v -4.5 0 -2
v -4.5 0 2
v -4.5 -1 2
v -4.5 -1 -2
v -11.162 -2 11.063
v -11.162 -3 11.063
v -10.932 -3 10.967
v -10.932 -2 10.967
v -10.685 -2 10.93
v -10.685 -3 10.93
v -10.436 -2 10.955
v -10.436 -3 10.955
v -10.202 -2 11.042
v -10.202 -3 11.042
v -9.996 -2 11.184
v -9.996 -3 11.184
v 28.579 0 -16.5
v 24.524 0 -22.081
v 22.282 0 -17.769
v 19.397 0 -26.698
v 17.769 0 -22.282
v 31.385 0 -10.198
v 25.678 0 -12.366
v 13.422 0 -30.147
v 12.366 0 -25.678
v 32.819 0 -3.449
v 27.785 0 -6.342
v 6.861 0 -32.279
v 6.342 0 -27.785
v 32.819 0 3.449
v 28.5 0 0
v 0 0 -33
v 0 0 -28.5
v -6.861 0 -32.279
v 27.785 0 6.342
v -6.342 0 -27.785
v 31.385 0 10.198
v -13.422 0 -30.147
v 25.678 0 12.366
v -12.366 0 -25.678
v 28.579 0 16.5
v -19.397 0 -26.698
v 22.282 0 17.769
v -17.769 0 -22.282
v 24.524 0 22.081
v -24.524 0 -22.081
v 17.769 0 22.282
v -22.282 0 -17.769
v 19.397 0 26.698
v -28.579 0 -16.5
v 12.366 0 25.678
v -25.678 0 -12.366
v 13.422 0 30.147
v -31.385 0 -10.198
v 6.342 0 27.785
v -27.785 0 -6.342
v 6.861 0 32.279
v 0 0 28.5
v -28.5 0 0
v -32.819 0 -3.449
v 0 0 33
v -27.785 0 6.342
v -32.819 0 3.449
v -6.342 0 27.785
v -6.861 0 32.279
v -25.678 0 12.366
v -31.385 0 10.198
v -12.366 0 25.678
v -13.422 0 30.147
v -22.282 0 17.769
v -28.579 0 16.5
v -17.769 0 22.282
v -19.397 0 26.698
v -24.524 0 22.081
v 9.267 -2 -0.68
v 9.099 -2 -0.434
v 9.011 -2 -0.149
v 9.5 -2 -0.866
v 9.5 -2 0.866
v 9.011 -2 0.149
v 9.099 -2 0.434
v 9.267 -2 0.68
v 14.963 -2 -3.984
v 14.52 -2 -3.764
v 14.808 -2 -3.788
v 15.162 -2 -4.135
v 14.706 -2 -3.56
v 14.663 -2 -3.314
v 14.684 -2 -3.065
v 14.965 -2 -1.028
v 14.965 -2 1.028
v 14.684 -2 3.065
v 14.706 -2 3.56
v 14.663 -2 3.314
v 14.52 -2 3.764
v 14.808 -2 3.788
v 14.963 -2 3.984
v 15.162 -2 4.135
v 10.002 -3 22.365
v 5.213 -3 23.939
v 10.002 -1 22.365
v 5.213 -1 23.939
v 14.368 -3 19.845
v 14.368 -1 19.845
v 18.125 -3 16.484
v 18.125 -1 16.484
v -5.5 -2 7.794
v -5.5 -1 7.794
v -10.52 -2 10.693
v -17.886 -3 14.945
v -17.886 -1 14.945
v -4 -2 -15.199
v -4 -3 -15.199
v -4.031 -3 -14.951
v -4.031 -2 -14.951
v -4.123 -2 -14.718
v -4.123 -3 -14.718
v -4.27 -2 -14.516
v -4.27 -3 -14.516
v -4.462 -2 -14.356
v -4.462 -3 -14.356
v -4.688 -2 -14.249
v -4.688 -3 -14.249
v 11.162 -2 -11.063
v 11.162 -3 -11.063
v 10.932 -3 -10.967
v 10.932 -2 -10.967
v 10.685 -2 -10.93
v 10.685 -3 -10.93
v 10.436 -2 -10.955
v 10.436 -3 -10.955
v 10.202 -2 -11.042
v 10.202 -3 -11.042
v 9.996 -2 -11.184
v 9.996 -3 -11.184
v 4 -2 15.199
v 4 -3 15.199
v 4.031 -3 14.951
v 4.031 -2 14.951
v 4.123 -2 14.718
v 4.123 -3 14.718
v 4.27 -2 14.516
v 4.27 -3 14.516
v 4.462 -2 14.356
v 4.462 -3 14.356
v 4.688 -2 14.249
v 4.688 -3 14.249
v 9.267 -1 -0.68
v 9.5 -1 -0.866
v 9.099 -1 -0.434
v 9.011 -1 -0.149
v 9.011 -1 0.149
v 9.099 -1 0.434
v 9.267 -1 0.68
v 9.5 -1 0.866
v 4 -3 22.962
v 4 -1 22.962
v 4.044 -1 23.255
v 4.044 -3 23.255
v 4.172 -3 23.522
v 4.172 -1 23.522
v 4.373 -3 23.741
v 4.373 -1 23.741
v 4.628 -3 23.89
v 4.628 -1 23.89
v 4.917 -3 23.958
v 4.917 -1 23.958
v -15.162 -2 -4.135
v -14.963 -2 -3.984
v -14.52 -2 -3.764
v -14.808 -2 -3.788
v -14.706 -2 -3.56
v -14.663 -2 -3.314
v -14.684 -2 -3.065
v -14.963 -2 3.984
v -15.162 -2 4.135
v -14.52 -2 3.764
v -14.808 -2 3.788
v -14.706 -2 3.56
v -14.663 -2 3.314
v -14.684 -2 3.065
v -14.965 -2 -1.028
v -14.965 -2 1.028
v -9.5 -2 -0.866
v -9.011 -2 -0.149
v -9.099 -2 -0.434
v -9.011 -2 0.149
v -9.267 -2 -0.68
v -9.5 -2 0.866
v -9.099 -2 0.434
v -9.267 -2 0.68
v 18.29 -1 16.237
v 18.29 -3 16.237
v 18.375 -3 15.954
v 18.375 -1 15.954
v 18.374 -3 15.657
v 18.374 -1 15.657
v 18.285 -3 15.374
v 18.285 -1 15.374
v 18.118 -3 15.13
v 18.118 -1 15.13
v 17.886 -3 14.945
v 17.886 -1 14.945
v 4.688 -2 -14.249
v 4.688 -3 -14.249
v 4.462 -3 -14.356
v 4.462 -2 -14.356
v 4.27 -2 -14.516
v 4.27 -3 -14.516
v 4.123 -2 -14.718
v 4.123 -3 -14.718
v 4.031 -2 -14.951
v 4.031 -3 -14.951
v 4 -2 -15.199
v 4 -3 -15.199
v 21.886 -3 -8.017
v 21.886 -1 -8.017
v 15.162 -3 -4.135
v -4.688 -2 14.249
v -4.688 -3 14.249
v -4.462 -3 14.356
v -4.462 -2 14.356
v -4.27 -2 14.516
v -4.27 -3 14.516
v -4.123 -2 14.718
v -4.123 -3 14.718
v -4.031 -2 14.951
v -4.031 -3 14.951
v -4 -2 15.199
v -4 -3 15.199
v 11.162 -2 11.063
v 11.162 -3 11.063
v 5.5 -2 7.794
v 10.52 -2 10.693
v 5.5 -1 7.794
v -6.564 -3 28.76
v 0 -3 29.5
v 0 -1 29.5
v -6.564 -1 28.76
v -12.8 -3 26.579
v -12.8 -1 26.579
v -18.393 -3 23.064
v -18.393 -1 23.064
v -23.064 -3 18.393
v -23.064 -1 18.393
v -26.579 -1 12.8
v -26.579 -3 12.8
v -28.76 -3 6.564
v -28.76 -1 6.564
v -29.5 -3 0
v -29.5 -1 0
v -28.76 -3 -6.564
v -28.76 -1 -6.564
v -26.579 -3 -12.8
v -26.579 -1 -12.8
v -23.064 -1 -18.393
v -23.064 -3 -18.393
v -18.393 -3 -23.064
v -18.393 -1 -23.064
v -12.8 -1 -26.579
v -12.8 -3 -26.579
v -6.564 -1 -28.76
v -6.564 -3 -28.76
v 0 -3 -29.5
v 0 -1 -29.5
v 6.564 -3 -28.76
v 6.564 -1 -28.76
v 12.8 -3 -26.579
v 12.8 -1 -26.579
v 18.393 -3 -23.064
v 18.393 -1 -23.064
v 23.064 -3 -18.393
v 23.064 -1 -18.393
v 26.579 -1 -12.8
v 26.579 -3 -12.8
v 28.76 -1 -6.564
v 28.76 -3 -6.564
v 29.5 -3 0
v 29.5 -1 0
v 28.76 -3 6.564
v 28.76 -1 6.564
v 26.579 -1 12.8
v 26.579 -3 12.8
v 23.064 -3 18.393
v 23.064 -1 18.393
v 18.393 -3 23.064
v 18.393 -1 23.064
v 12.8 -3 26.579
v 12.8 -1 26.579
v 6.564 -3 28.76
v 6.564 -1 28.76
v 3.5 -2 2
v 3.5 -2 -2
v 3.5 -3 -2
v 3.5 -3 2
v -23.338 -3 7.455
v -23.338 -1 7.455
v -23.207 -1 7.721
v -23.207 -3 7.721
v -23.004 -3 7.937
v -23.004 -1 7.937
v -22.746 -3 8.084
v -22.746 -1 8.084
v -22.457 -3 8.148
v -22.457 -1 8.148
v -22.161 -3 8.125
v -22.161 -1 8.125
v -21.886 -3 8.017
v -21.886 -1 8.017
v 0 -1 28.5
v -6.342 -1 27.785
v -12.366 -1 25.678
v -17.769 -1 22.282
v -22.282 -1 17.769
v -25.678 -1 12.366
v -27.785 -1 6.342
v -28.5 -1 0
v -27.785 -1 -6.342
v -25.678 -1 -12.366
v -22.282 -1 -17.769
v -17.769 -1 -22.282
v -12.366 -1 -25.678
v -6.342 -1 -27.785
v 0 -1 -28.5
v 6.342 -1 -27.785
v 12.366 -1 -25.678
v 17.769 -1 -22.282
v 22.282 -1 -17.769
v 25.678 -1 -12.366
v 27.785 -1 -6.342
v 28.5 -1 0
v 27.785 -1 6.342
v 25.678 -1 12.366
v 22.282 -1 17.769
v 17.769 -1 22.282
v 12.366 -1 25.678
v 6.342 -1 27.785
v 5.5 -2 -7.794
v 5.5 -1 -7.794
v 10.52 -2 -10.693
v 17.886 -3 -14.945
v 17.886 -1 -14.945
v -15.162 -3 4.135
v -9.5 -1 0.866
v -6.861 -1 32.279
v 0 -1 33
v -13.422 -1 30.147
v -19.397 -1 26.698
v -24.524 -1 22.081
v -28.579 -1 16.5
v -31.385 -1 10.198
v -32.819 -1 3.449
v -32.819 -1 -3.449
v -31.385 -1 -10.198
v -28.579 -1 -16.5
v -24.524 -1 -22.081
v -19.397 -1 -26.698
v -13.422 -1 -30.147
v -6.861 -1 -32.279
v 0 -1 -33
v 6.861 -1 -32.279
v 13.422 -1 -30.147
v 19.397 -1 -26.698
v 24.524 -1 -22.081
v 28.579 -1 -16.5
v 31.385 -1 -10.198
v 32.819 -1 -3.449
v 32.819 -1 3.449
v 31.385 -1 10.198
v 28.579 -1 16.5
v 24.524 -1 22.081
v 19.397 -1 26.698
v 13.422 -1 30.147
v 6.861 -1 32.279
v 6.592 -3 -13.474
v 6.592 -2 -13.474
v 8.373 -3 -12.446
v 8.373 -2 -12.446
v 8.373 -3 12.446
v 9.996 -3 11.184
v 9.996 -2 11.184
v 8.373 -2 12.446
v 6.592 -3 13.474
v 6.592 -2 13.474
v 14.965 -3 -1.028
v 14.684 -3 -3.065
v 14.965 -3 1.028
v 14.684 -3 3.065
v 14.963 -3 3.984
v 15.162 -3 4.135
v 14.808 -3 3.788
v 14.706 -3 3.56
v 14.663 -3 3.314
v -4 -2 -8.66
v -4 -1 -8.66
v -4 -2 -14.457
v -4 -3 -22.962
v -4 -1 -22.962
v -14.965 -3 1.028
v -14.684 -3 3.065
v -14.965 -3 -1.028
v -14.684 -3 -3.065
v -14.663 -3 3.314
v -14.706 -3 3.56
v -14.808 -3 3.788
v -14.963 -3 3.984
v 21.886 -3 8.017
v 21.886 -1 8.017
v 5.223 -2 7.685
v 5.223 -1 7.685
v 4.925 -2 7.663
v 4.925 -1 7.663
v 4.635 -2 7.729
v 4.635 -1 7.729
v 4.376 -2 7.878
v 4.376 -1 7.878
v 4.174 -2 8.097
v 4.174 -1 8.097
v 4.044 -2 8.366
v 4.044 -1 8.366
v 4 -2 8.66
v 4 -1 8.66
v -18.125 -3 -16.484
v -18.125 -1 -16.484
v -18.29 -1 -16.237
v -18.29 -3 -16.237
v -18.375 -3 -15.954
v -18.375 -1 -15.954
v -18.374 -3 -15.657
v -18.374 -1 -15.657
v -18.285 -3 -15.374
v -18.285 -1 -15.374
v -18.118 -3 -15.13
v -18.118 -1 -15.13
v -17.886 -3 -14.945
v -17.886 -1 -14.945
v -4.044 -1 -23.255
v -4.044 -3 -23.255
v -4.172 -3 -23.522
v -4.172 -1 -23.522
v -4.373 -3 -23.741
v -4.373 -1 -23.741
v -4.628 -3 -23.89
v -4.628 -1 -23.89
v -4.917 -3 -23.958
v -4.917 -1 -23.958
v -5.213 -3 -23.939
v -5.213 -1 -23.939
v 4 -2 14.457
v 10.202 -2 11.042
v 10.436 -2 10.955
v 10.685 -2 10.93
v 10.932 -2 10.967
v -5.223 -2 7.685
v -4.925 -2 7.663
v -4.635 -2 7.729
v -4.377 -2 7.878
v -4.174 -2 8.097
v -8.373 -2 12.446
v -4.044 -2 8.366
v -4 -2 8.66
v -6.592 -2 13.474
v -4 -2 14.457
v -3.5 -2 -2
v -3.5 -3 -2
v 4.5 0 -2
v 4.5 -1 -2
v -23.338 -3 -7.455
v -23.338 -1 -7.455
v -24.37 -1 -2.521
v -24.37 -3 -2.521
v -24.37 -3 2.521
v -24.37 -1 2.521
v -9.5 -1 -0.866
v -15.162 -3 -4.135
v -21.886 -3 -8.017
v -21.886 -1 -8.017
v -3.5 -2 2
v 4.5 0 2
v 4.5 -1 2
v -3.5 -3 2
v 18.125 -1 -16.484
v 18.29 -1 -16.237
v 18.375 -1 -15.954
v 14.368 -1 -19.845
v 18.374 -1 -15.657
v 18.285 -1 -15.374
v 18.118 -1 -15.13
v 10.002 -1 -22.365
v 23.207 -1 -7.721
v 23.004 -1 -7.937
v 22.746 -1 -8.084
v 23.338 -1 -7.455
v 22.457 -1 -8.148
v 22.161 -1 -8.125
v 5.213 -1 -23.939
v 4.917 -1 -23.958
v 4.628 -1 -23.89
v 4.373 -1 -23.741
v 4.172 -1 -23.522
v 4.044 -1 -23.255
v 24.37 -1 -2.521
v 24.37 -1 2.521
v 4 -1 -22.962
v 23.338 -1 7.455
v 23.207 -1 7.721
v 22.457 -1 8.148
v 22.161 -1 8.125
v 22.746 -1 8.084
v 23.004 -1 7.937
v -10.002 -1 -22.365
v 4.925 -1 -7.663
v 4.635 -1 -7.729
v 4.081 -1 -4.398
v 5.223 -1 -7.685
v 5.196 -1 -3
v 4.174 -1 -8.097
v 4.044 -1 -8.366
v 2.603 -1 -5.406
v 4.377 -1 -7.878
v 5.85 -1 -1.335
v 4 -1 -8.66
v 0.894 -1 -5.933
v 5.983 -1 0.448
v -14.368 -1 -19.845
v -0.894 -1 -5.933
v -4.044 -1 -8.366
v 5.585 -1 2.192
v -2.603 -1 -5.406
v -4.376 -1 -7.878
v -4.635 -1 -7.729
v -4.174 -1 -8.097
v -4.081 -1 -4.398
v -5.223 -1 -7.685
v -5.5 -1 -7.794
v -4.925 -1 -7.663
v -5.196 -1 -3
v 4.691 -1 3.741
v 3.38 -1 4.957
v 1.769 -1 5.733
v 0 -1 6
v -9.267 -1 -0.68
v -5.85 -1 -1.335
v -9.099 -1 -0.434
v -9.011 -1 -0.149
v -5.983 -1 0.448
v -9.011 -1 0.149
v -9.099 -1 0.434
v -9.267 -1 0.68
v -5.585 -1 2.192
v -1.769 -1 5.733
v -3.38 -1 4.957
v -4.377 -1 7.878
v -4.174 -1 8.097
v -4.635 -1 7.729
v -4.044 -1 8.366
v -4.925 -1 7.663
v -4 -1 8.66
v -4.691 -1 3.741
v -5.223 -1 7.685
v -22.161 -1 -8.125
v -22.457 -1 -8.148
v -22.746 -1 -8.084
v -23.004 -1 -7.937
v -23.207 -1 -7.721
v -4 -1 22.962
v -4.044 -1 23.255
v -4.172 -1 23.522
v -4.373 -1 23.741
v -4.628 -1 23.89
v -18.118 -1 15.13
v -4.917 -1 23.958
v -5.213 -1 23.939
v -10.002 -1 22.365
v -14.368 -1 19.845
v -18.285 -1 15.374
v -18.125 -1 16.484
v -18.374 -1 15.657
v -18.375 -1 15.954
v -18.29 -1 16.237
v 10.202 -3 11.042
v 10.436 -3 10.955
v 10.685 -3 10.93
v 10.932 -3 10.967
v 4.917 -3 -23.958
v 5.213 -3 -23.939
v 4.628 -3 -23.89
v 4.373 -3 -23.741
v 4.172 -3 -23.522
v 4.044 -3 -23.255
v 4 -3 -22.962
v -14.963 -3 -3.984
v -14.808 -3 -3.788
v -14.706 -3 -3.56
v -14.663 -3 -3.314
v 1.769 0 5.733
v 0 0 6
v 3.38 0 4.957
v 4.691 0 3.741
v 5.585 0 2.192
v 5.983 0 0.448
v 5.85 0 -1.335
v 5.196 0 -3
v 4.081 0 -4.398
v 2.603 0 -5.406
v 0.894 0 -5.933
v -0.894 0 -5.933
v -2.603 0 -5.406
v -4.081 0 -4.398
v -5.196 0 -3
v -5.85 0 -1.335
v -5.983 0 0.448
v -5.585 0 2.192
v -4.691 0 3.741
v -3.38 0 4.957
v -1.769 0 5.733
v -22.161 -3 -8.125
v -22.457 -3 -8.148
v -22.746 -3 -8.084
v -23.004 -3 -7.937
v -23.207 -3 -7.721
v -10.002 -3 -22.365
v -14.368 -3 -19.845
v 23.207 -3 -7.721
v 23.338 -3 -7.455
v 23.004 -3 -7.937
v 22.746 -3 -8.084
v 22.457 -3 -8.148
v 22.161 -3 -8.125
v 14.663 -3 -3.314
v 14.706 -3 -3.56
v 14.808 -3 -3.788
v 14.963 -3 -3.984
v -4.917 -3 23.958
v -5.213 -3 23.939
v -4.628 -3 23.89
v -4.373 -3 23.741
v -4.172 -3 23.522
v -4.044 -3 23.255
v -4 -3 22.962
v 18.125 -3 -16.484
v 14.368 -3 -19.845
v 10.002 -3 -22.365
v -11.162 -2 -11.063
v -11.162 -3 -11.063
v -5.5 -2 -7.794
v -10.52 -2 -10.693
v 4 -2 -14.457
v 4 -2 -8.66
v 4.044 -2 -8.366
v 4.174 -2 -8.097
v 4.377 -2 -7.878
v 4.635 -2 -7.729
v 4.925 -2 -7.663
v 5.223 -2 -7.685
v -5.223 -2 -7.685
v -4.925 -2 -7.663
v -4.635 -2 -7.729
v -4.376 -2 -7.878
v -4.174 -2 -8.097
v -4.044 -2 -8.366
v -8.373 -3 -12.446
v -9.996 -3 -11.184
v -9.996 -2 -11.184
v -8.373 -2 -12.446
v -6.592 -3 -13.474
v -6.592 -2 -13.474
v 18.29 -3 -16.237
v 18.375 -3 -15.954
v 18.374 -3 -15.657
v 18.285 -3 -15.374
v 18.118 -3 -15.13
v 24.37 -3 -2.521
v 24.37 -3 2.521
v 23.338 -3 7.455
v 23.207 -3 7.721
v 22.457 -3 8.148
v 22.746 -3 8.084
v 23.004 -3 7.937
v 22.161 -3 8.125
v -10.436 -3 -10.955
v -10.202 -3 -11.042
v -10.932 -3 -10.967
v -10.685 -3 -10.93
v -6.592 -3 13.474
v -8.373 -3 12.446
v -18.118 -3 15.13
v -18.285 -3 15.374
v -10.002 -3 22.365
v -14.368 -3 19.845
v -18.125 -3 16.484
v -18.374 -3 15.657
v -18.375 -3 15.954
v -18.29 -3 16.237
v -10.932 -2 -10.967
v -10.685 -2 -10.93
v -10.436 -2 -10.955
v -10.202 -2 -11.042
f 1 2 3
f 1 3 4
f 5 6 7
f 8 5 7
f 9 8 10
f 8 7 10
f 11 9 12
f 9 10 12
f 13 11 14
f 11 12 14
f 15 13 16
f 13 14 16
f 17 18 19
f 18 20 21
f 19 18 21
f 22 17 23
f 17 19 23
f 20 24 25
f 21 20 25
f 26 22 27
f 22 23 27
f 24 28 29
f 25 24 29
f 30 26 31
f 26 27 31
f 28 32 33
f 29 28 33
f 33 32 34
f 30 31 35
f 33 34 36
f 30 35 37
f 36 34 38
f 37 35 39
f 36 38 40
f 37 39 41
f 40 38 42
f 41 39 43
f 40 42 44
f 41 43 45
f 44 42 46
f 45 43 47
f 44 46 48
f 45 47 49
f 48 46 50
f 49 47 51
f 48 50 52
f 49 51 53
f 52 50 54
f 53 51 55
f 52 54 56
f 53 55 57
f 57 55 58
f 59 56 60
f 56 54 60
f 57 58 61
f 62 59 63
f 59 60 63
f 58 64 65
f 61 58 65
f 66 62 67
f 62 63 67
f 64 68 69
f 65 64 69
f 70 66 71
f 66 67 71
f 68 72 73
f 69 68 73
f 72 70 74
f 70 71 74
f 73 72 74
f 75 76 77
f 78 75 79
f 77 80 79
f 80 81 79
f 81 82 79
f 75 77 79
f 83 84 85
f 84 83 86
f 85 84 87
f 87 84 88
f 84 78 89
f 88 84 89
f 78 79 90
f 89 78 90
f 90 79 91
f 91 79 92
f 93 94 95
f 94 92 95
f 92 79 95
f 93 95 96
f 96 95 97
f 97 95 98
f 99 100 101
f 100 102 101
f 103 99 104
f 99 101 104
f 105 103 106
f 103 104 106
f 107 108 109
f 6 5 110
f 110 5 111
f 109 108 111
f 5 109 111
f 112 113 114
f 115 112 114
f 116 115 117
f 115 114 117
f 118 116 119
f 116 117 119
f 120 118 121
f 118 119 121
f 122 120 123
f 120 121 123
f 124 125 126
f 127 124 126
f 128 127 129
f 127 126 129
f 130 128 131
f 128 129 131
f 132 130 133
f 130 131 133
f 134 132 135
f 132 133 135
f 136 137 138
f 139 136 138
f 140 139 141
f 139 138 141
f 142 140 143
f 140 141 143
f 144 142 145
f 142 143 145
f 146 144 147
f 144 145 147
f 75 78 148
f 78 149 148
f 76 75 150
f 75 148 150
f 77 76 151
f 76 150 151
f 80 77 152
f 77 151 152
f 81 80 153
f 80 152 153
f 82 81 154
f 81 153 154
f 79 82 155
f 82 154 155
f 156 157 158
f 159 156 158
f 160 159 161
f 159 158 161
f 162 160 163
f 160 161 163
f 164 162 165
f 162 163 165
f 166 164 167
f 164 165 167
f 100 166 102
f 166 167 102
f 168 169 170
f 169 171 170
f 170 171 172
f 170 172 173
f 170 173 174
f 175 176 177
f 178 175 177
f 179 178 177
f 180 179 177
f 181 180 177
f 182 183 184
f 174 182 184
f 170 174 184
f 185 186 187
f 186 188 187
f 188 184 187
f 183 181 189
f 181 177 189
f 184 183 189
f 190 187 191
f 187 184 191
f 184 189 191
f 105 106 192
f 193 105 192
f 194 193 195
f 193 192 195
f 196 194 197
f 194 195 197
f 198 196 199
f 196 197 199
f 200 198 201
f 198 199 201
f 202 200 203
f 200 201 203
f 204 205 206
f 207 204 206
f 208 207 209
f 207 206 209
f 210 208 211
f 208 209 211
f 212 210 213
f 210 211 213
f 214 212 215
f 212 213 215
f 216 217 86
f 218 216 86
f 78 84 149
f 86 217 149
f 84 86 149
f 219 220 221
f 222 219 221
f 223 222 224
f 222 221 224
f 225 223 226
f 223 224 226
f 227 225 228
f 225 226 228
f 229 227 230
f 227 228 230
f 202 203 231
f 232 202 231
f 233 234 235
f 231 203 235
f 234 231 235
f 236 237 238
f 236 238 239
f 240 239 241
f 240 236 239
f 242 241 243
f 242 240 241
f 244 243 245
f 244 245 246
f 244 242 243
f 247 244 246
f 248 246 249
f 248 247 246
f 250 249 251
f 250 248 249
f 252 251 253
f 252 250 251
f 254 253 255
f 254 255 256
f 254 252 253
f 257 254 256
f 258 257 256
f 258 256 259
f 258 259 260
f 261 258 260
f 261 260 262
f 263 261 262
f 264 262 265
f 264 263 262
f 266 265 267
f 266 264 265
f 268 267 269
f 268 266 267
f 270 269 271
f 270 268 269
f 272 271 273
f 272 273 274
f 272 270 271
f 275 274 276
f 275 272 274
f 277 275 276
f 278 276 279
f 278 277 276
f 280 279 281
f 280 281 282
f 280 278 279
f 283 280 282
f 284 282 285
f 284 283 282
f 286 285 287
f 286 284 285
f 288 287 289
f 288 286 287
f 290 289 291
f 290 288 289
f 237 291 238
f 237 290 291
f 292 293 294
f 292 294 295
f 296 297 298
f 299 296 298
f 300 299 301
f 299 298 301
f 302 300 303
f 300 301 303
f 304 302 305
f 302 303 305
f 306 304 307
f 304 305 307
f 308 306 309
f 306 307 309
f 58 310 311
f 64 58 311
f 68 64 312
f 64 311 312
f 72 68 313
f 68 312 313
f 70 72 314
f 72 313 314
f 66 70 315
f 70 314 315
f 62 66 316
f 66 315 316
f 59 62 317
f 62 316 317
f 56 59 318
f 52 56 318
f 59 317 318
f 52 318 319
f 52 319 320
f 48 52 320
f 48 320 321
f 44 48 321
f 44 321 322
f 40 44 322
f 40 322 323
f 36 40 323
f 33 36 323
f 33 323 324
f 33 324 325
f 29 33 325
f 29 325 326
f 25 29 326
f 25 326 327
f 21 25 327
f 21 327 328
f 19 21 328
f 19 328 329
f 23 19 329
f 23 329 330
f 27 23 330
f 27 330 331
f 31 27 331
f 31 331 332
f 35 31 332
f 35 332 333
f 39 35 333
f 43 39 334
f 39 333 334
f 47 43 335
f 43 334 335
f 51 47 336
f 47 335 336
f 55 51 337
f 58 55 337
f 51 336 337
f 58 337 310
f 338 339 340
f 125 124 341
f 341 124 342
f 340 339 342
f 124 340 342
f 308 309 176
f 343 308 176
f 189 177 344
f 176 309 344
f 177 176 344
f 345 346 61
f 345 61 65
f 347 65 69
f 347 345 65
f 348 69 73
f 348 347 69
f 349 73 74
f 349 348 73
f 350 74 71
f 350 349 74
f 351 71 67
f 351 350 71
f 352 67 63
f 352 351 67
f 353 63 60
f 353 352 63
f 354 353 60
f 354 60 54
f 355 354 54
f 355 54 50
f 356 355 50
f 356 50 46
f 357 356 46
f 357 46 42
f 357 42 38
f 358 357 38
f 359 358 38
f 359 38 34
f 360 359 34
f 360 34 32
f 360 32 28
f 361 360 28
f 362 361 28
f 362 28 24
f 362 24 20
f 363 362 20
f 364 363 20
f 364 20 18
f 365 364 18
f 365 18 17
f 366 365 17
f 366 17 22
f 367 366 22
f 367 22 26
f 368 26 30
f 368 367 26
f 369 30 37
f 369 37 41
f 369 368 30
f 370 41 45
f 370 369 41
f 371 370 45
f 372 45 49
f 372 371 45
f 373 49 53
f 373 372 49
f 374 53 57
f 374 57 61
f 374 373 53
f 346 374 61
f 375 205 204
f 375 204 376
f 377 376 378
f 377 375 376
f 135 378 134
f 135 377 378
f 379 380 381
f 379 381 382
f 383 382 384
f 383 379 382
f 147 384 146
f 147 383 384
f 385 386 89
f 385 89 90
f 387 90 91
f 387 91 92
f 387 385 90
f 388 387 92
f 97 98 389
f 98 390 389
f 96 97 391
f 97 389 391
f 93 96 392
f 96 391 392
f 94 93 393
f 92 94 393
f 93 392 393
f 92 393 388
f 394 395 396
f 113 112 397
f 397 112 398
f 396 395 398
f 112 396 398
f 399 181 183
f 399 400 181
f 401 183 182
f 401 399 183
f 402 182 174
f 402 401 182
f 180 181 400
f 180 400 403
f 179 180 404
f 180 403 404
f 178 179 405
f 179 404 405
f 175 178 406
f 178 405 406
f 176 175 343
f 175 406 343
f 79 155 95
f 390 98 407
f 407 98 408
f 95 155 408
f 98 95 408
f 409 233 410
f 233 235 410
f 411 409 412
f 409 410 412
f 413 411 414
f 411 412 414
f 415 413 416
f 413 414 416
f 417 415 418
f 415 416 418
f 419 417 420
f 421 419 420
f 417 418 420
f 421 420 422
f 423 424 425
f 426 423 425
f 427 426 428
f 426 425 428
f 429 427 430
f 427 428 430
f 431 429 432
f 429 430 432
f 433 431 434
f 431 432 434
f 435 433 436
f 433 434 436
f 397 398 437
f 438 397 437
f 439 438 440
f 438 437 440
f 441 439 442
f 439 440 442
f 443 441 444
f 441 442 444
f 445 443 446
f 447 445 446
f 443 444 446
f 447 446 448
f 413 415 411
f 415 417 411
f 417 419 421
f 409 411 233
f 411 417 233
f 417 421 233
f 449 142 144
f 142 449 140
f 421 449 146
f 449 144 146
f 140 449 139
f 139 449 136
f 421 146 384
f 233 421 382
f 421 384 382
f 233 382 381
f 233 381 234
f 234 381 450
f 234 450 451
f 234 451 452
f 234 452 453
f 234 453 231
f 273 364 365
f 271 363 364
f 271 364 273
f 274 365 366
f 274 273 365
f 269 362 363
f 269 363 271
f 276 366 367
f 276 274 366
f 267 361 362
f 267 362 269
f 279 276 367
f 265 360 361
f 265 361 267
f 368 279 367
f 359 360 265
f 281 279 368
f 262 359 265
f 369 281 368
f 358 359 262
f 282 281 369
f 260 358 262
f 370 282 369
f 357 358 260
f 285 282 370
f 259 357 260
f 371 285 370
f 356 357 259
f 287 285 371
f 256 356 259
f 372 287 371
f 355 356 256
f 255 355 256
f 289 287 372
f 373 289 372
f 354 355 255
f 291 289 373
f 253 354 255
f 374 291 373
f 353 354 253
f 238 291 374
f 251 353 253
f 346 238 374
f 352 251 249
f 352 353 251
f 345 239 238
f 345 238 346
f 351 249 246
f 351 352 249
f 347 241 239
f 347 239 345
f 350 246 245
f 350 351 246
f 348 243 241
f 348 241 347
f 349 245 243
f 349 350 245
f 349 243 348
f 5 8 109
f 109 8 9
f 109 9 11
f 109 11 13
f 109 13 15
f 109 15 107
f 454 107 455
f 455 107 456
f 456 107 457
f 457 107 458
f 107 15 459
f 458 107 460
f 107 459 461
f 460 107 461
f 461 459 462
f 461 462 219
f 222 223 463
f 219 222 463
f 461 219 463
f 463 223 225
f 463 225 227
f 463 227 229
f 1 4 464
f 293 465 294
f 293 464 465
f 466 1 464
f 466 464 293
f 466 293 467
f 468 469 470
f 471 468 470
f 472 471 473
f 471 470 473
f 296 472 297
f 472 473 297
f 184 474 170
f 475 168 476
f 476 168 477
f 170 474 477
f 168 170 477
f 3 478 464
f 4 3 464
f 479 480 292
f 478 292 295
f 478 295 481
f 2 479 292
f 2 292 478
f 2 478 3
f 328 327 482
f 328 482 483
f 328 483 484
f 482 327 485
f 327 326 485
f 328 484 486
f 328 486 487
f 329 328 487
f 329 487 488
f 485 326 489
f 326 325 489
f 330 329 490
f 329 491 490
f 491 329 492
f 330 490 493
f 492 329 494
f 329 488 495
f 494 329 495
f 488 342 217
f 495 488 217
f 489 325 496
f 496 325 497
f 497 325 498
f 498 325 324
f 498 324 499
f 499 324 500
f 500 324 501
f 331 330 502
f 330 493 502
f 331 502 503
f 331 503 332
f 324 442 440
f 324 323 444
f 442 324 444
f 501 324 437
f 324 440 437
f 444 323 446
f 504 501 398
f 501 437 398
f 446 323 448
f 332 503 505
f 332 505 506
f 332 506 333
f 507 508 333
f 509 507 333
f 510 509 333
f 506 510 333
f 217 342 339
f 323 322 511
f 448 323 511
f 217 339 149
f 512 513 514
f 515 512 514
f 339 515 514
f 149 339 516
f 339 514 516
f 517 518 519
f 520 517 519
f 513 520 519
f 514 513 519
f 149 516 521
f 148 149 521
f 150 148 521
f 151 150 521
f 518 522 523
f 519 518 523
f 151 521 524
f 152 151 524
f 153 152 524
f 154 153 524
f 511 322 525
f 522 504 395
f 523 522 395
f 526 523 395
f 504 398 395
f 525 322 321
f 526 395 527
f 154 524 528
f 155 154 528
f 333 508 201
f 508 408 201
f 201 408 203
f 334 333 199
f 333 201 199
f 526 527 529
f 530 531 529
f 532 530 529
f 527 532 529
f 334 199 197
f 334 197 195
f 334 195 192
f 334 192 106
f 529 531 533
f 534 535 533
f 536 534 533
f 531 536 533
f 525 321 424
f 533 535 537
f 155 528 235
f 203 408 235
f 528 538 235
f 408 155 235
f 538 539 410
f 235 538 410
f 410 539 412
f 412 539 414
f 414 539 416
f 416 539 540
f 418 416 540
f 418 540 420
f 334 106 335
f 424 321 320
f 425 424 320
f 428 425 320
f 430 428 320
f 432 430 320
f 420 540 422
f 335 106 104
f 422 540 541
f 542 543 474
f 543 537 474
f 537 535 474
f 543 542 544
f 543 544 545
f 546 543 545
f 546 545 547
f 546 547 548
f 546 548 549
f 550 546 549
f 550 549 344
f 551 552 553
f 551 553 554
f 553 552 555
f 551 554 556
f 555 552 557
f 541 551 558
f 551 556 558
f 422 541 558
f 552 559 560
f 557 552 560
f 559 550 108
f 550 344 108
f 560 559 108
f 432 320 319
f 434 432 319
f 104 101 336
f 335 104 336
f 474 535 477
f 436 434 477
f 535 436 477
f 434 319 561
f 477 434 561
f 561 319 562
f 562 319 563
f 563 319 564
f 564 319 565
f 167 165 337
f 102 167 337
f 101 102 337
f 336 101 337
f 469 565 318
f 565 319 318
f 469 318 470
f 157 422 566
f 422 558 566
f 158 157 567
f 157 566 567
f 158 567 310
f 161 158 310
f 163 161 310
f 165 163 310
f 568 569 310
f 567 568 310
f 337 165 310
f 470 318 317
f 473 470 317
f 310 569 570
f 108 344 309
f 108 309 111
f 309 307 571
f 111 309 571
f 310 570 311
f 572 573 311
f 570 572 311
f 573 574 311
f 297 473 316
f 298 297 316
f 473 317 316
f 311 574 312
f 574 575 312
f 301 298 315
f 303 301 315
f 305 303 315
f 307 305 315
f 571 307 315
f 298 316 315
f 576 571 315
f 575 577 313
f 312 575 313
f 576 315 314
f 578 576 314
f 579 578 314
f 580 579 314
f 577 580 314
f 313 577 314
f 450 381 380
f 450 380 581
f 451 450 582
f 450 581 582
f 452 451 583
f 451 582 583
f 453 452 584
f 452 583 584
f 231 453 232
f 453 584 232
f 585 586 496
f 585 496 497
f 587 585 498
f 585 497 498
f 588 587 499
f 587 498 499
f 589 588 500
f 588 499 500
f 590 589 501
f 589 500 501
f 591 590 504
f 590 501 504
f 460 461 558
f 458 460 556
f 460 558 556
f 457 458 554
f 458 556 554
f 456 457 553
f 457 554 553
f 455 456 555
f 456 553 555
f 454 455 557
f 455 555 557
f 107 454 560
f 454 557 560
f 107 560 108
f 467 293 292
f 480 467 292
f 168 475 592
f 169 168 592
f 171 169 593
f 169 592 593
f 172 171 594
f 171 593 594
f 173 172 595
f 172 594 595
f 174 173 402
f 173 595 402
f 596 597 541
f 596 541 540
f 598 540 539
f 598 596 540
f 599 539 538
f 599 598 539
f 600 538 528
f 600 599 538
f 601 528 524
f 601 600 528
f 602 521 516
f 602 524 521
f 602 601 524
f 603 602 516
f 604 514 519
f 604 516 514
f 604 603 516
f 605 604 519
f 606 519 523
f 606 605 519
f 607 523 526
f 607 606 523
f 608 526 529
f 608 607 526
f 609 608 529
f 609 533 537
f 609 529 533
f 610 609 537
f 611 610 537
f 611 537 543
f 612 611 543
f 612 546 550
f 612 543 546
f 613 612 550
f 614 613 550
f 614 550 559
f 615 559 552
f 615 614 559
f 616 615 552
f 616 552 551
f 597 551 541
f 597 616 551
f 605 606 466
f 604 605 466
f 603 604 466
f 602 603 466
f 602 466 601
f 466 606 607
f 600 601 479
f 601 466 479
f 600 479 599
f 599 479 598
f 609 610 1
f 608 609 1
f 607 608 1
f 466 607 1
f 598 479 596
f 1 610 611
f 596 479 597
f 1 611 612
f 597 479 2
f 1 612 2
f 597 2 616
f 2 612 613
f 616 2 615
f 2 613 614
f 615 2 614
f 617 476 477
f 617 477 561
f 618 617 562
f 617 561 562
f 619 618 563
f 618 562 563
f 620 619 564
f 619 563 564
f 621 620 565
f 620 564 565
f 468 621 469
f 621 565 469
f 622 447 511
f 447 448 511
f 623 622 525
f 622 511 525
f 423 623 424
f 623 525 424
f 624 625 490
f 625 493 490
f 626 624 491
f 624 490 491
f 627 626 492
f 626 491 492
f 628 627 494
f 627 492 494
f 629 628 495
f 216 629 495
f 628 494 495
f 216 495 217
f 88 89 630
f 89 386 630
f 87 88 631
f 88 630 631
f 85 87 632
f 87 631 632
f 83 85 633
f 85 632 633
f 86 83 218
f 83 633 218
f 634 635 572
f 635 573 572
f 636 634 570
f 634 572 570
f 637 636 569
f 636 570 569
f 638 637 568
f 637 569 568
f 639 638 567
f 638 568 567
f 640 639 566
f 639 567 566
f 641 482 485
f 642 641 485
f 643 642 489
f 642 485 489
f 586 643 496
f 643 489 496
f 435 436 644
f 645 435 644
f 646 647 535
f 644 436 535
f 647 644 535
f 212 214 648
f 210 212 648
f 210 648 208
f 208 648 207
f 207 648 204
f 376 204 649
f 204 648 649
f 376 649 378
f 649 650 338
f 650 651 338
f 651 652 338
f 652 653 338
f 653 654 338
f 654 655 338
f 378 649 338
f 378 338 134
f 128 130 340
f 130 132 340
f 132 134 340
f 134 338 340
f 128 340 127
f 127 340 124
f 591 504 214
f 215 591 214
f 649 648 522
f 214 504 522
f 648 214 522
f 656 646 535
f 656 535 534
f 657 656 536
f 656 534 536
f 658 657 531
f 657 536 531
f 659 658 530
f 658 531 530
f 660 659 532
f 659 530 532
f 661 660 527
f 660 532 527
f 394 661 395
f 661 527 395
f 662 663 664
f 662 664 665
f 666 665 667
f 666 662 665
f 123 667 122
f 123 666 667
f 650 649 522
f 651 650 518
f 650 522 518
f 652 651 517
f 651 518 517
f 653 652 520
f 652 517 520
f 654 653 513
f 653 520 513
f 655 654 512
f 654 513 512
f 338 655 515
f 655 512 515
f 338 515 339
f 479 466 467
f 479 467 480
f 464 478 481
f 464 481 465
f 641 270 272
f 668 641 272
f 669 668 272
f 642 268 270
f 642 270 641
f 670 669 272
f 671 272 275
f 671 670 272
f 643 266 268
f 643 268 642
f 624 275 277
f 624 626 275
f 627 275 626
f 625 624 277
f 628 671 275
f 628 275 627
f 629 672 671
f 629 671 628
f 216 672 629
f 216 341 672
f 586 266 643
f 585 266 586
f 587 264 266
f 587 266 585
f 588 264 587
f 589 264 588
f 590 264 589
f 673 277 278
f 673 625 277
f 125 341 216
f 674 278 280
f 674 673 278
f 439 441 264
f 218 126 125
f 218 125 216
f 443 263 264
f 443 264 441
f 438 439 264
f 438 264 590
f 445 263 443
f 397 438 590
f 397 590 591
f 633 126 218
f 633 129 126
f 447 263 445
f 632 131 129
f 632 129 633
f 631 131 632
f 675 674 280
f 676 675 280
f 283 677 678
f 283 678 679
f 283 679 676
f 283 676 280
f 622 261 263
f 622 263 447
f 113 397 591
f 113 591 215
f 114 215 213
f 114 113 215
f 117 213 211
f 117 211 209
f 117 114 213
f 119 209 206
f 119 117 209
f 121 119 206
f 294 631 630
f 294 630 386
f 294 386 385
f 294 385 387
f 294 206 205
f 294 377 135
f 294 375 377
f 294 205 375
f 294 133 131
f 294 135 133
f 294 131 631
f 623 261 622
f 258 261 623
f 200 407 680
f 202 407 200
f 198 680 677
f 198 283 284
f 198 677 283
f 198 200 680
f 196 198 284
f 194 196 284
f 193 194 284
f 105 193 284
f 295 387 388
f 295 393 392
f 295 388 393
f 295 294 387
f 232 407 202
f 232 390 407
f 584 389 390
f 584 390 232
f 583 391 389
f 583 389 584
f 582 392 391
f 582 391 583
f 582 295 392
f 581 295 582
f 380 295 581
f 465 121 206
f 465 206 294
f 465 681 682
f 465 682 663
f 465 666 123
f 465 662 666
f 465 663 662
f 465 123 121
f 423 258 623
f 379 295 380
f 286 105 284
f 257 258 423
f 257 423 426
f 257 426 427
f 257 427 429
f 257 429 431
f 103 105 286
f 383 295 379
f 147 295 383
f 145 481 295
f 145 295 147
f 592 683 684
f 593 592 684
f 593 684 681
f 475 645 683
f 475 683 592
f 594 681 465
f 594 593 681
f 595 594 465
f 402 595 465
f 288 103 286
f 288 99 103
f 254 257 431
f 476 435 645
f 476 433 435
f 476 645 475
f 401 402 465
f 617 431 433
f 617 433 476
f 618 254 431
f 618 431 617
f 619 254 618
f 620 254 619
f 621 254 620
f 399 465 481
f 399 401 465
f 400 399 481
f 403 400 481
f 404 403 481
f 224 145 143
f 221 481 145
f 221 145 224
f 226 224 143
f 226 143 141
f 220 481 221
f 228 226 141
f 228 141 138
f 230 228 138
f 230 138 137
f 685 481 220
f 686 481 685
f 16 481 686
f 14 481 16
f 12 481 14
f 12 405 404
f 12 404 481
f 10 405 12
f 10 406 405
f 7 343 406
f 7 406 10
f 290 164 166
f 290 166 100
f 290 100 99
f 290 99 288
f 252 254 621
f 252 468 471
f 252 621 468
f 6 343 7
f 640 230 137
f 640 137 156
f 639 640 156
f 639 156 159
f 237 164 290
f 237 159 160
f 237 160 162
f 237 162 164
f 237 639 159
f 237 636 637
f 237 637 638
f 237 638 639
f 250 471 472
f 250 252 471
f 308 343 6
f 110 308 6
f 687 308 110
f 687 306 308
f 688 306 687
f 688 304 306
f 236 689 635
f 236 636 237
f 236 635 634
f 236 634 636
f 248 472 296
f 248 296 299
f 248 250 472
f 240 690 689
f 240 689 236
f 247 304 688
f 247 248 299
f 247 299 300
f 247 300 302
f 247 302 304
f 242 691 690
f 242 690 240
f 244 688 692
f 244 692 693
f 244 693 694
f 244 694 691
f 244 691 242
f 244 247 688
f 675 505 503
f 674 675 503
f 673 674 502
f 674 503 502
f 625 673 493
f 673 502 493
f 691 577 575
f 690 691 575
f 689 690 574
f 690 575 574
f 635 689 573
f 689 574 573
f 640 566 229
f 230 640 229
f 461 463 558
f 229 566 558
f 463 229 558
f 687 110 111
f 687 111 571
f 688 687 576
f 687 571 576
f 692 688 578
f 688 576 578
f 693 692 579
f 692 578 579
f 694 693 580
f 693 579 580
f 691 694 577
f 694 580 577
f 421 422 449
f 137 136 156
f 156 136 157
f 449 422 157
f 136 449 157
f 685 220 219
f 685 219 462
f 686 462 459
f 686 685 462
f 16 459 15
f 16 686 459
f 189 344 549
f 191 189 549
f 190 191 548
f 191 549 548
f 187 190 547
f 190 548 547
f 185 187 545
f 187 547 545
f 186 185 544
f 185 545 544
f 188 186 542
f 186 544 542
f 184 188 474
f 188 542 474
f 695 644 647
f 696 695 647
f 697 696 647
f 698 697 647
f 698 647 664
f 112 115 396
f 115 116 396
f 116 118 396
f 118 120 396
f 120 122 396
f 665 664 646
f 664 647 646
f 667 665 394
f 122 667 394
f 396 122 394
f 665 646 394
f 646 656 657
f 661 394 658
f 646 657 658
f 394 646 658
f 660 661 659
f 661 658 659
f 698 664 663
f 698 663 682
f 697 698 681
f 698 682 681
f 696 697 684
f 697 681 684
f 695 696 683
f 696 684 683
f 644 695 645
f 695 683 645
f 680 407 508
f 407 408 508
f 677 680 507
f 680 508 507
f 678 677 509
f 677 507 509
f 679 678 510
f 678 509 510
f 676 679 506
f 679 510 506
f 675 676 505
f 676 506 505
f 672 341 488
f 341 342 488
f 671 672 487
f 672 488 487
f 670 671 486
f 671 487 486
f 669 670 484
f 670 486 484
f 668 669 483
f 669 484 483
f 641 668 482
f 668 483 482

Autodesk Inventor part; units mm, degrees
ref_plane "YZ Plane" through (0, 0, 0) normal (1, 0, 0) x (0, 1, 0)
ref_plane "XZ Plane" through (0, 0, 0) normal (0, 1, 0) x (-1, 0, 0)
ref_plane "XY Plane" through (0, 0, 0) normal (0, 0, 1) x (1, 0, 0)
sketch "Sketch1" plane through (0, 0, 0) normal (1, 0, 0) x (0, 1, 0)
  line L0 (0, 0) -> (-3, 0)
  line L1 (0, 28.5) -> (0, 33)
  line L2 (0, 33) -> (-1, 33)
  line L3 (-1, 33) -> (-1, 29.5)
  line L4 (-1, 29.5) -> (-3, 29.5)
  line L5 (-3, 29.5) -> (-3, 0)
  line L6 (0, 28.5) -> (-1, 28.5)
  line L7 (-1, 28.5) -> (-1, 5)
  line L8 (-2, 2.5) -> (-3, 2.5)
  line L9 (-1, 5) -> (-2, 5)
  line L10 (-2, 5) -> (-2, 0)
  line L11 (0, 33) -> (0, 0) construction
  line L12 (-1, 5) -> (0, 5)
  line L13 (-1, 6) -> (0, 6)
  line L14 (0, 5) -> (0, 6)
  line L15 (0, 6) -> (0, 0)
  line L16 (0, 0) -> (-3, 0)
  point P0 (-1, 2.5)
  point P1 (0, 5)
  dimension "d0" = 66
  dimension "d2" = 3
  dimension "d3" = 1
  dimension "d6" = 1
  dimension "d20" = 5
  dimension "d21" = 10
  dimension "d22" = 1
  dimension "d23" = 1
  dimension "d31" = 59
  dimension "d32" = 1
revolve "Revolution1" add sketch "Sketch1" angle 360 about axis through (0, 0, 0) along (0, -1, 0)
sketch "Sketch2" plane through (0, -1, 0) normal (0, 1, 0) x (1, 0, 0)
  arc A0 (-24.6817, 14.25) -> (-24.6817, -14.25) centre (0, 0) ccw
  line L0 (-1.7321, -1) -> (-24.6817, -14.25)
  line L1 (-1.7321, 1) -> (-24.6817, 14.25)
  arc A1 (-1.7321, 1) -> (-1.7321, -1) centre (0, 0) ccw
  line L2 (-28.5, 0) -> (0, 0) construction
  line L3 (0, 0) -> (-24.6817, -14.25) construction
  line L4 (0, 0) -> (-24.6817, 14.25) construction
  line L5 (-21.8856, -8.0169) -> (-9.5, -0.866)
  arc A2 (-5.873, -1.228) -> (-5.873, 1.228) centre (0, 0) ccw
  line L6 (-9.5, 0.866) -> (-21.8856, 8.0169)
  arc A3 (-23.3382, 7.4551) -> (-23.3382, -7.4551) centre (0, 0) ccw
  arc A4 (-9.5, -0.866) -> (-9.5, 0.866) centre (-10, 0) ccw
  arc A5 (-21.8856, 8.0169) -> (-23.3382, 7.4551) centre (-22.3856, 7.1508) ccw
  arc A6 (-23.3382, -7.4551) -> (-21.8856, -8.0169) centre (-22.3856, -7.1508) ccw
  arc A7 (-18.1254, -16.4839) -> (-5.2128, -23.939) centre (0, 0) ccw
  arc A8 (-5.2128, -23.939) -> (-4, -22.9619) centre (-5, -22.9619) ccw
  line L7 (-4, -22.9619) -> (-4, -8.6603)
  arc A9 (-4, -8.6603) -> (-5.5, -7.7942) centre (-5, -8.6603) ccw
  line L8 (-5.5, -7.7942) -> (-17.8856, -14.9451)
  arc A10 (-17.8856, -14.9451) -> (-18.1254, -16.4839) centre (-17.3856, -15.8111) ccw
  arc A11 (5.2128, -23.939) -> (18.1254, -16.4839) centre (0, 0) ccw
  arc A12 (18.1254, -16.4839) -> (17.8856, -14.9451) centre (17.3856, -15.8111) ccw
  line L9 (17.8856, -14.9451) -> (5.5, -7.7942)
  arc A13 (5.5, -7.7942) -> (4, -8.6603) centre (5, -8.6603) ccw
  line L10 (4, -8.6603) -> (4, -22.9619)
  arc A14 (4, -22.9619) -> (5.2128, -23.939) centre (5, -22.9619) ccw
  arc A15 (23.3382, -7.4551) -> (23.3382, 7.4551) centre (0, 0) ccw
  arc A16 (23.3382, 7.4551) -> (21.8856, 8.0169) centre (22.3856, 7.1508) ccw
  line L11 (21.8856, 8.0169) -> (9.5, 0.866)
  arc A17 (9.5, 0.866) -> (9.5, -0.866) centre (10, 0) ccw
  line L12 (9.5, -0.866) -> (21.8856, -8.0169)
  arc A18 (21.8856, -8.0169) -> (23.3382, -7.4551) centre (22.3856, -7.1508) ccw
  arc A19 (18.1254, 16.4839) -> (5.2128, 23.939) centre (0, 0) ccw
  arc A20 (5.2128, 23.939) -> (4, 22.9619) centre (5, 22.9619) ccw
  line L13 (4, 22.9619) -> (4, 8.6603)
  arc A21 (4, 8.6603) -> (5.5, 7.7942) centre (5, 8.6603) ccw
  line L14 (5.5, 7.7942) -> (17.8856, 14.9451)
  arc A22 (17.8856, 14.9451) -> (18.1254, 16.4839) centre (17.3856, 15.8111) ccw
  arc A23 (-5.2128, 23.939) -> (-18.1254, 16.4839) centre (0, 0) ccw
  arc A24 (-18.1254, 16.4839) -> (-17.8856, 14.9451) centre (-17.3856, 15.8111) ccw
  line L15 (-17.8856, 14.9451) -> (-5.5, 7.7942)
  arc A25 (-5.5, 7.7942) -> (-4, 8.6603) centre (-5, 8.6603) ccw
  line L16 (-4, 8.6603) -> (-4, 22.9619)
  arc A26 (-4, 22.9619) -> (-5.2128, 23.939) centre (-5, 22.9619) ccw
  circle A27 centre (0, 0) radius 28.5 construction
  point P0 (-22.9329, -8.6215)
  point P1 (-22.9329, 8.6215)
  point P2 (-4, -4.4721)
  point P3 (-1.873, -5.7002)
  point P4 (1.873, -5.7002)
  point P5 (4, -4.4721)
  point P6 (5.873, -1.228)
  point P7 (5.873, 1.228)
  point P8 (4, 4.4721)
  point P9 (1.873, 5.7002)
  point P10 (-1.873, 5.7002)
  point P11 (-4, 4.4721)
  dimension "d7" = 60
  dimension "d8" = 2
  dimension "d13" = 4
  dimension "d15" = 1
  dimension "d18" = 360
extrude "Extrusion1" cut sketch "Sketch2" against normal through all contours A6 A3 A5 L6 A4 L5 | A10 L8 A9 L7 A8 A7 | A14 L10 A13 L9 A12 A11 | A18 L12 A17 L11 A16 A15 | A22 L14 A21 L13 A20 A19 | A26 L16 A25 L15 A24 A23
sketch "Sketch3" plane through (0, 0, 0) normal (0, 1, 0) x (1, 0, 0)
  line L0 (3.5, -2) -> (-3.5, -2)
  line L1 (-3.5, -2) -> (-3.5, 2)
  line L2 (-3.5, 2) -> (3.5, 2)
  line L3 (3.5, 2) -> (3.5, -2)
  line L4 (3.5, -2) -> (-3.5, 2) construction
  line L5 (-3.5, -2) -> (3.5, 2) construction
  circle A0 centre (0, 0) radius 33 projected
  circle A1 centre (0, 0) radius 28.5 projected
  circle A2 centre (0, 0) radius 6 projected
  line L6 (-5.6569, -2) -> (5.6569, -2)
  circle A3 centre (0, 0) radius 6 projected
  line L7 (-5.6569, 2) -> (5.6569, 2)
  line L8 (-4.5, -2) -> (-4.5, 2)
  line L9 (4.5, 2) -> (4.5, -2)
  line L10 (0, -2) -> (0, 2) construction
  point P0 (3.5, 2)
  point P1 (3.5, -2)
  point P2 (-3.5, -2)
  point P3 (-3.5, 2)
  dimension "d24" = 4
  dimension "d27" = 9
  dimension "d36" = 7
extrude "Extrusion2" cut sketch "Sketch3" against normal through all contours L0 L1 L2 L3
extrude "Extrusion3" cut sketch "Sketch3" against normal blind 2 contours L3 L7 L9 L6 | L6 L8 L7 L1
chamfer "Chamfer1" distance 1 angle 45 2 edges at (-4.5, -2, 0) (4.5, -2, 0)
sketch "Sketch4" plane through (0, -3, 0) normal (0, -1, 0) x (1, 0, 0)
  line L0 (-3.5, -2) -> (3.5, -2) projected
  line L1 (3.5, -2) -> (3.5, 2) projected
  line L2 (3.5, 2) -> (-3.5, 2) projected
  line L3 (-3.5, 2) -> (-3.5, -2) projected
  arc A0 (18.1254, -16.4839) -> (17.8856, -14.9451) centre (17.3856, -15.8111) ccw projected
  line L4 (17.8856, -14.9451) -> (5.5, -7.7942) projected
  arc A1 (5.5, -7.7942) -> (4, -8.6603) centre (5, -8.6603) ccw projected
  line L5 (4, -8.6603) -> (4, -22.9619) projected
  arc A2 (4, -22.9619) -> (5.2128, -23.939) centre (5, -22.9619) ccw projected
  arc A3 (5.2128, -23.939) -> (18.1254, -16.4839) centre (0, 0) ccw projected
  arc A4 (-18.1254, 16.4839) -> (-17.8856, 14.9451) centre (-17.3856, 15.8111) ccw projected
  line L6 (-17.8856, 14.9451) -> (-5.5, 7.7942) projected
  arc A5 (-5.5, 7.7942) -> (-4, 8.6603) centre (-5, 8.6603) ccw projected
  line L7 (-4, 8.6603) -> (-4, 22.9619) projected
  arc A6 (-4, 22.9619) -> (-5.2128, 23.939) centre (-5, 22.9619) ccw projected
  arc A7 (-5.2128, 23.939) -> (-18.1254, 16.4839) centre (0, 0) ccw projected
  arc A8 (-5.2128, -23.939) -> (-4, -22.9619) centre (-5, -22.9619) ccw projected
  line L8 (-4, -22.9619) -> (-4, -8.6603) projected
  arc A9 (-4, -8.6603) -> (-5.5, -7.7942) centre (-5, -8.6603) ccw projected
  line L9 (-5.5, -7.7942) -> (-17.8856, -14.9451) projected
  arc A10 (-17.8856, -14.9451) -> (-18.1254, -16.4839) centre (-17.3856, -15.8111) ccw projected
  arc A11 (-18.1254, -16.4839) -> (-5.2128, -23.939) centre (0, 0) ccw projected
  arc A12 (23.3382, 7.4551) -> (21.8856, 8.0169) centre (22.3856, 7.1508) ccw projected
  line L10 (21.8856, 8.0169) -> (9.5, 0.866) projected
  arc A13 (9.5, 0.866) -> (9.5, -0.866) centre (10, 0) ccw projected
  line L11 (9.5, -0.866) -> (21.8856, -8.0169) projected
  arc A14 (21.8856, -8.0169) -> (23.3382, -7.4551) centre (22.3856, -7.1508) ccw projected
  arc A15 (23.3382, -7.4551) -> (23.3382, 7.4551) centre (0, 0) ccw projected
  arc A16 (5.2128, 23.939) -> (4, 22.9619) centre (5, 22.9619) ccw projected
  line L12 (4, 22.9619) -> (4, 8.6603) projected
  arc A17 (4, 8.6603) -> (5.5, 7.7942) centre (5, 8.6603) ccw projected
  line L13 (5.5, 7.7942) -> (17.8856, 14.9451) projected
  arc A18 (17.8856, 14.9451) -> (18.1254, 16.4839) centre (17.3856, 15.8111) ccw projected
  arc A19 (18.1254, 16.4839) -> (5.2128, 23.939) centre (0, 0) ccw projected
  arc A20 (-21.8856, 8.0169) -> (-23.3382, 7.4551) centre (-22.3856, 7.1508) ccw projected
  arc A21 (-23.3382, 7.4551) -> (-23.3382, -7.4551) centre (0, 0) ccw projected
  arc A22 (-23.3382, -7.4551) -> (-21.8856, -8.0169) centre (-22.3856, -7.1508) ccw projected
  line L14 (-21.8856, -8.0169) -> (-9.5, -0.866) projected
  arc A23 (-9.5, -0.866) -> (-9.5, 0.866) centre (-10, 0) ccw projected
  line L15 (-9.5, 0.866) -> (-21.8856, 8.0169) projected
  circle A24 centre (0, 0) radius 29.5 projected
  circle A25 centre (0, 0) radius 15
  dimension "d33" = 30
extrude "Extrusion4" add sketch "Sketch4" against normal blind 1 contours A25 L5 A1 L4 | L4 A1 L5 A25 L8 A9 L9 L14 A23 L15 L6 A5 L7 L12 A17 L13 L10 A13 L11 | L11 A13 L10 A25 | A25 L9 A9 L8 | A25 L15 A23 L14 | L13 A17 L12 A25 | A25 L7 A5 L6
fillet "Fillet2" radius 1 12 edges at (4, -2.5, -14.4568) (10.52, -2.5, -10.6925) (14.52, -2.5, -3.7643) (14.52, -2.5, 3.7643) (10.52, -2.5, 10.6925) (4, -2.5, 14.4568) (-4, -2.5, 14.4568) (-14.52, -2.5, -3.7643) (-4, -2.5, -14.4568) (-10.52, -2.5, -10.6925) (-14.52, -2.5, 3.7643) (-10.52, -2.5, 10.6925)
properties part number "FS-03-SLBV1"
